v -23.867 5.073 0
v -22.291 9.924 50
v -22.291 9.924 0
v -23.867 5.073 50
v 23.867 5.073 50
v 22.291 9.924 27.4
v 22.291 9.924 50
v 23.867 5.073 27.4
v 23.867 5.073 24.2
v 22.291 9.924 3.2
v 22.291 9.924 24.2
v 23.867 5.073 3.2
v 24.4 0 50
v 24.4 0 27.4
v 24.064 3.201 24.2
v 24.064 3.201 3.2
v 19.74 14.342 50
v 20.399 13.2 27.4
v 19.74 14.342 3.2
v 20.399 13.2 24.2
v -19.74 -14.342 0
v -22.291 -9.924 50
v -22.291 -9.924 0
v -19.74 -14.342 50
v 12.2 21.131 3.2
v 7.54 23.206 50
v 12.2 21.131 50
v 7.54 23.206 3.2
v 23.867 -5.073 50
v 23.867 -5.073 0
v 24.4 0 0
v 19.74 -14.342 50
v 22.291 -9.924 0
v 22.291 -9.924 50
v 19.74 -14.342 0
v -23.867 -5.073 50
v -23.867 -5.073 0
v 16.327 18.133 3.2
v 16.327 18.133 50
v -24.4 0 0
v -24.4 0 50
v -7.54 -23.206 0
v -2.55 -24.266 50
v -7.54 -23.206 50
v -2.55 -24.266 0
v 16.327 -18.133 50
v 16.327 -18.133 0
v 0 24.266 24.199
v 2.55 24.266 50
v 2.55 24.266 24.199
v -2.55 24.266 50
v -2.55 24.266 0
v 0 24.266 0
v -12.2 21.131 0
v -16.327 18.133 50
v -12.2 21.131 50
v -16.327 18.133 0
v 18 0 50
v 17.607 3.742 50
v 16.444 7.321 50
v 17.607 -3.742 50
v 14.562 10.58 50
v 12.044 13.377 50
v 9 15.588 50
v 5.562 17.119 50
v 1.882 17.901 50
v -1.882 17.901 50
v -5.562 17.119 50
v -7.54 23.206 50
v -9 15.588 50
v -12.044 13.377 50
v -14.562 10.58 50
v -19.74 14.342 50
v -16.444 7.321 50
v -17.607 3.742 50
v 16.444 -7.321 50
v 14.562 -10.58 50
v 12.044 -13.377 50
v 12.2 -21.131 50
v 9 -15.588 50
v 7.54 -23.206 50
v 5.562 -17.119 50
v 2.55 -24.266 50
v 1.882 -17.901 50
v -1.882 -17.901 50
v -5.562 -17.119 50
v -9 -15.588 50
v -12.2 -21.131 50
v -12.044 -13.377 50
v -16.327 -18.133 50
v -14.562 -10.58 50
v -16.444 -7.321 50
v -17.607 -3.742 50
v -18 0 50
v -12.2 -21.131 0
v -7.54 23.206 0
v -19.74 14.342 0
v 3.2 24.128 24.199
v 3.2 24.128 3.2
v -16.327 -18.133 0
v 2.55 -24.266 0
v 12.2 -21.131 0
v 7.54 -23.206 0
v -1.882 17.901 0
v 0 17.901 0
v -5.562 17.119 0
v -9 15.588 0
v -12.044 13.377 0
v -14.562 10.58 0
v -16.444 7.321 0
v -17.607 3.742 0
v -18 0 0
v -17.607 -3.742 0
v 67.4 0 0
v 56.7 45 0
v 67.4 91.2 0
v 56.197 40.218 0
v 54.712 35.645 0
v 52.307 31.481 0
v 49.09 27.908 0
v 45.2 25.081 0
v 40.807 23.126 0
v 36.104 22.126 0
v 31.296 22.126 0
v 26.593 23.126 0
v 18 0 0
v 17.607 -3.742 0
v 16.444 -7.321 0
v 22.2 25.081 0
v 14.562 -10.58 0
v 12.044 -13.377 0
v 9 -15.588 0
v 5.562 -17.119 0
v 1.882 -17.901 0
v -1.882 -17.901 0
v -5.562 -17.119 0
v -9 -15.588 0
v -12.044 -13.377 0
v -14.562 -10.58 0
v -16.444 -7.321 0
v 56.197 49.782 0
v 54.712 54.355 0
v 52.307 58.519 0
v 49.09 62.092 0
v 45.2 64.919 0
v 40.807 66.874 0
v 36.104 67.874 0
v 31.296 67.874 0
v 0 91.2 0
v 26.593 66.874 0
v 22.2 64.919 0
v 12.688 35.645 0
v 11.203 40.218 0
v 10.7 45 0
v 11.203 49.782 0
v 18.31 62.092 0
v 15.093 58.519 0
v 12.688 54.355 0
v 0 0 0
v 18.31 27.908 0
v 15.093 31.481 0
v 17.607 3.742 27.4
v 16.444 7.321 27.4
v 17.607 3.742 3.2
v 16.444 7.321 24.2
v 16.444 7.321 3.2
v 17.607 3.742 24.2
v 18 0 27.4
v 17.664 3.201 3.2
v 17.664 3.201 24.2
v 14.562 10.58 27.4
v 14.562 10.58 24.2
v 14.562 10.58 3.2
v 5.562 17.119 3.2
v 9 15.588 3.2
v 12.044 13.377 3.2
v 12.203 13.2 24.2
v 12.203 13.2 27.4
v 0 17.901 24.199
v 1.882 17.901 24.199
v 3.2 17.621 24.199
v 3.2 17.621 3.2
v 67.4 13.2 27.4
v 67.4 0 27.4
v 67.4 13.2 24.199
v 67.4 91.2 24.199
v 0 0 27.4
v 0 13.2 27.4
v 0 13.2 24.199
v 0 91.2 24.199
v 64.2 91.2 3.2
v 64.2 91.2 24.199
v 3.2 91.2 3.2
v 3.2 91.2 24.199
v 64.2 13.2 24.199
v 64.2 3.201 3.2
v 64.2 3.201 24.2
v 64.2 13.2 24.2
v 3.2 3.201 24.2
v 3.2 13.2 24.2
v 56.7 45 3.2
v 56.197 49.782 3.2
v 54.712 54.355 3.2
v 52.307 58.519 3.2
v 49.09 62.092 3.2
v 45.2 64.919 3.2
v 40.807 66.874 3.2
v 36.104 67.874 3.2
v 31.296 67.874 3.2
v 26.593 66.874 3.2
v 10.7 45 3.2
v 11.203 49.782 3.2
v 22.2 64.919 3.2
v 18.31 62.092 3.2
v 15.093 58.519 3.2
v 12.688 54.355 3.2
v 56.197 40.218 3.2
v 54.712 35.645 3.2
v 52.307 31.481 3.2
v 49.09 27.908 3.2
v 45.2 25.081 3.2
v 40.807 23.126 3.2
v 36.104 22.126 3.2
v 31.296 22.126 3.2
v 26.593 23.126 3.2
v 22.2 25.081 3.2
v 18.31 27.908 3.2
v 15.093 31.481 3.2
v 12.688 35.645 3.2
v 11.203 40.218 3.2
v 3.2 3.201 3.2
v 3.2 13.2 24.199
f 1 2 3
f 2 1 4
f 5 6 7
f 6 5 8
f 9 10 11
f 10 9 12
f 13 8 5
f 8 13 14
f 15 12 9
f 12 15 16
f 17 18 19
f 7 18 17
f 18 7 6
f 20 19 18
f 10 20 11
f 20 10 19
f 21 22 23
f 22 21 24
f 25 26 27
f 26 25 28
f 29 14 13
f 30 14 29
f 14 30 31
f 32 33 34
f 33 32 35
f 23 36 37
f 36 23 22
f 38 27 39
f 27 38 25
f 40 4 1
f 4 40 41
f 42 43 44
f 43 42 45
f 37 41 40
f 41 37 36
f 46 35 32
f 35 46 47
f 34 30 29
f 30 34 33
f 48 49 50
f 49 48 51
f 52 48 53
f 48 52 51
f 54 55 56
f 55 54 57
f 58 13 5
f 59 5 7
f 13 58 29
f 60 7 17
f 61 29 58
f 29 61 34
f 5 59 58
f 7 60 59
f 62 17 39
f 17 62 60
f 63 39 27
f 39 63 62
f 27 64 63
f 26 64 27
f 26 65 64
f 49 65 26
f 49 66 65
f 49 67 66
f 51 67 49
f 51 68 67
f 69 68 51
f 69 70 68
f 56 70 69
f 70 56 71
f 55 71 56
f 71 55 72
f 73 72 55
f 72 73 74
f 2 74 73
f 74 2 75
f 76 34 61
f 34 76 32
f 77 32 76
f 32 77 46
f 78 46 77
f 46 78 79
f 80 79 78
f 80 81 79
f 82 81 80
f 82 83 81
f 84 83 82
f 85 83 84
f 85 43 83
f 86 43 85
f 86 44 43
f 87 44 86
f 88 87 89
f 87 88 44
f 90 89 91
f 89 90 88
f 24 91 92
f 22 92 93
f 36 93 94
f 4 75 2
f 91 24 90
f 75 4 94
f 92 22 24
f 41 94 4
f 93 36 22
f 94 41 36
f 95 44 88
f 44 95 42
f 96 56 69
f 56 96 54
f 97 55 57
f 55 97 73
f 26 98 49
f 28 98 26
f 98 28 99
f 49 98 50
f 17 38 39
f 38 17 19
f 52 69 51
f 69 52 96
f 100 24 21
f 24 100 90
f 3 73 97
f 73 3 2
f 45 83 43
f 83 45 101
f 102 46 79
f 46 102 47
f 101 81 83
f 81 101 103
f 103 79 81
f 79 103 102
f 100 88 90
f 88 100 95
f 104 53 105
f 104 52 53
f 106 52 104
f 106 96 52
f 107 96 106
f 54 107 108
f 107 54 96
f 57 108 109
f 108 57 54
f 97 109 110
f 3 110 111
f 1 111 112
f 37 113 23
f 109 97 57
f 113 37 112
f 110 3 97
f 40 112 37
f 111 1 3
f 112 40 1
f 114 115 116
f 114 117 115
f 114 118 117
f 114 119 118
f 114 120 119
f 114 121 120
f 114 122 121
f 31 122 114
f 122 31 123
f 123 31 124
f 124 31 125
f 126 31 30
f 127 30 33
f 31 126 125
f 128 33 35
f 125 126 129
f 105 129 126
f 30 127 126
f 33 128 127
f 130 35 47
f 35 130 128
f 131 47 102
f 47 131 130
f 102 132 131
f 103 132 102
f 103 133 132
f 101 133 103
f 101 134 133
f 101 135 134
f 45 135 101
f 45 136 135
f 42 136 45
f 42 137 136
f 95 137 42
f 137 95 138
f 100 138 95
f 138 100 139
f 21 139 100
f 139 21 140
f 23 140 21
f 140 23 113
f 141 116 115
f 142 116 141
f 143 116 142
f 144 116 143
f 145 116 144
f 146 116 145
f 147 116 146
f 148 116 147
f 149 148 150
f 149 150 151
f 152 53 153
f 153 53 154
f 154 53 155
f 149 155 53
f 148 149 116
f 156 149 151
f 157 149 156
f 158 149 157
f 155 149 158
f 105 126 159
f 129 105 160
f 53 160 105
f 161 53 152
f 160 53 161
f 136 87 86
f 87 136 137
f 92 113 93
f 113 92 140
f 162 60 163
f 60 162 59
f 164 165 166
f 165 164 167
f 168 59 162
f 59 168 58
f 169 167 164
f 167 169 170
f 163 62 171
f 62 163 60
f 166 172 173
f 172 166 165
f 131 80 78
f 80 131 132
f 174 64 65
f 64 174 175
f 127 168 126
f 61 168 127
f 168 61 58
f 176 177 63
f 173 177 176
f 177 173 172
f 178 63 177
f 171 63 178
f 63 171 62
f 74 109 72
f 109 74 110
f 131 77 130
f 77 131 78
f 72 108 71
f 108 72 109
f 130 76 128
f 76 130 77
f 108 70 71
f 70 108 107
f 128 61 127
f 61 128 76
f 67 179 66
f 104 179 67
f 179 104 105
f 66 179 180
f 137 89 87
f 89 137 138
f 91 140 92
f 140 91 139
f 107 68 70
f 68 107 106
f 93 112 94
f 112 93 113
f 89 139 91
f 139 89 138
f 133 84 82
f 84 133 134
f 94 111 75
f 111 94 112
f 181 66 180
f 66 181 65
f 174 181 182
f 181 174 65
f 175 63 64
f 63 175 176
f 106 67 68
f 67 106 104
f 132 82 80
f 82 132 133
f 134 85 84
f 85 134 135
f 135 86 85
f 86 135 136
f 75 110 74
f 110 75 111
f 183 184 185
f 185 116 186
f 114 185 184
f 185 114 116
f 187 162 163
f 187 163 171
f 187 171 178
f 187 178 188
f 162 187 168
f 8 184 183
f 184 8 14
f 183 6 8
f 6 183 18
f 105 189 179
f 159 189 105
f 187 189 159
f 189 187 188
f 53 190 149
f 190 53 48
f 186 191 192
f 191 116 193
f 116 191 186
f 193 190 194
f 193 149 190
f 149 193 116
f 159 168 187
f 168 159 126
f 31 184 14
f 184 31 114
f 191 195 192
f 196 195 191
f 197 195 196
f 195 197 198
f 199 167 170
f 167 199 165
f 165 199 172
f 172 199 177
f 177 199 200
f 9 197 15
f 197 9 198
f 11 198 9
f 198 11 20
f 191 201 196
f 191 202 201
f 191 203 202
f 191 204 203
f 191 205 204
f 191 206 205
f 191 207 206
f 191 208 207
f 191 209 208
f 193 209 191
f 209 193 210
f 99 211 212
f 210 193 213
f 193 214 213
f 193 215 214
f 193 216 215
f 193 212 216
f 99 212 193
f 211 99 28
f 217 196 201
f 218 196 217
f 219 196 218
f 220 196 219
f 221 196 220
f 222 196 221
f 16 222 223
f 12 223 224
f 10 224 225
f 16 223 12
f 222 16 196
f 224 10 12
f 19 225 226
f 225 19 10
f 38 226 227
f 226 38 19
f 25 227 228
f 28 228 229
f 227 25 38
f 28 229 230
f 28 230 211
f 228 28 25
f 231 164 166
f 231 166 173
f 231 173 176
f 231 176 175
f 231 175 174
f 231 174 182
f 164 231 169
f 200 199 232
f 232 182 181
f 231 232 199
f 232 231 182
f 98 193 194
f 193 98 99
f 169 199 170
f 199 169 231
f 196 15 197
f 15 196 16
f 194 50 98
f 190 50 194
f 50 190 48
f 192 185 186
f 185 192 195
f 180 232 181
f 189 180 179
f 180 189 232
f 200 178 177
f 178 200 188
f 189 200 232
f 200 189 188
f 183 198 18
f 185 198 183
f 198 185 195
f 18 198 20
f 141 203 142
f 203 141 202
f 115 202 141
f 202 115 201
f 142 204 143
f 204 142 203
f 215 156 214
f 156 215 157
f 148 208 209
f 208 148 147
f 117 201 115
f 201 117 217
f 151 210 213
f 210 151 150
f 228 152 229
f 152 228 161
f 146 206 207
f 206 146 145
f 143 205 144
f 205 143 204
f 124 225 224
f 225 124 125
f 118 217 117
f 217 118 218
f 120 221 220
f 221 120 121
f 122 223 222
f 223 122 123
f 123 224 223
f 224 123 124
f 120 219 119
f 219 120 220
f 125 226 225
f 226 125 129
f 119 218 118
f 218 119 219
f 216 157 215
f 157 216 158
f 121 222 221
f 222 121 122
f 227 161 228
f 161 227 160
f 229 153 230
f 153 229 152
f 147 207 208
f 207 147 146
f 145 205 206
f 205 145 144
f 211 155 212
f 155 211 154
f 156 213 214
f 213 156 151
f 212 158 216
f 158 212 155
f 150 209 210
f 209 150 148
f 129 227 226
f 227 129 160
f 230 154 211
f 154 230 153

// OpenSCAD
nozzleWidth=0.4;
wall=nozzleWidth*8;
wall2=wall*2;
e=0.001;
e2=e*2;

vacuumThroat();

module vacuumThroat() {
    vacuumPipe();
    blockHolder();
}

module vacuumPipe() {
    pipeD = 36; 
    pipeH = 50;
    cylinderThick(pipeD, pipeH, wall2*2);
}

module cylinderThick(diameter, height, wall) {
    difference() {
        cylinder(d=diameter+wall, h=height);
        translate([0,0,-e]) cylinder(d=diameter, h=height+e2);
    }
}

motorEdgeH=5+1; // how much does the motor extend below the holder
motorEdgeD=43+3;
motorEdgeFromFront=23-1;
motorEdgeFromBack=22-2;
motorEdgeFromSides=8-1;
motorSpiningAxis=17+5;
motorSpindelKnut=22+5;
motorSpindelKnutBottom=30+1;

aluminumBlockX=60+1;
aluminumBlockY=88;
aluminumBlockZ=21;
module aluminumBlock() {
    x=aluminumBlockX; // aluminum holder for the motor
    
    cube([aluminumBlockX,aluminumBlockY,aluminumBlockZ]);
}

module blockHolder() {
    w=wall;
    topHangY=10;
    difference() {
        cube([aluminumBlockX+w*2,aluminumBlockY+w,aluminumBlockZ+w*2]);
        translate([w,w+e,w]) aluminumBlock();
        translate([-e,topHangY+w,aluminumBlockZ+w-e]) cube([aluminumBlockX+w*2+e2,aluminumBlockY-topHangY+e,w+e2]);
        translate([aluminumBlockX/2+w,motorEdgeFromFront+motorEdgeD/2,w-motorEdgeH+e]) cylinder(h=motorEdgeH,d=motorEdgeD);
    }
}



vacuumeHoseD=36+2;
